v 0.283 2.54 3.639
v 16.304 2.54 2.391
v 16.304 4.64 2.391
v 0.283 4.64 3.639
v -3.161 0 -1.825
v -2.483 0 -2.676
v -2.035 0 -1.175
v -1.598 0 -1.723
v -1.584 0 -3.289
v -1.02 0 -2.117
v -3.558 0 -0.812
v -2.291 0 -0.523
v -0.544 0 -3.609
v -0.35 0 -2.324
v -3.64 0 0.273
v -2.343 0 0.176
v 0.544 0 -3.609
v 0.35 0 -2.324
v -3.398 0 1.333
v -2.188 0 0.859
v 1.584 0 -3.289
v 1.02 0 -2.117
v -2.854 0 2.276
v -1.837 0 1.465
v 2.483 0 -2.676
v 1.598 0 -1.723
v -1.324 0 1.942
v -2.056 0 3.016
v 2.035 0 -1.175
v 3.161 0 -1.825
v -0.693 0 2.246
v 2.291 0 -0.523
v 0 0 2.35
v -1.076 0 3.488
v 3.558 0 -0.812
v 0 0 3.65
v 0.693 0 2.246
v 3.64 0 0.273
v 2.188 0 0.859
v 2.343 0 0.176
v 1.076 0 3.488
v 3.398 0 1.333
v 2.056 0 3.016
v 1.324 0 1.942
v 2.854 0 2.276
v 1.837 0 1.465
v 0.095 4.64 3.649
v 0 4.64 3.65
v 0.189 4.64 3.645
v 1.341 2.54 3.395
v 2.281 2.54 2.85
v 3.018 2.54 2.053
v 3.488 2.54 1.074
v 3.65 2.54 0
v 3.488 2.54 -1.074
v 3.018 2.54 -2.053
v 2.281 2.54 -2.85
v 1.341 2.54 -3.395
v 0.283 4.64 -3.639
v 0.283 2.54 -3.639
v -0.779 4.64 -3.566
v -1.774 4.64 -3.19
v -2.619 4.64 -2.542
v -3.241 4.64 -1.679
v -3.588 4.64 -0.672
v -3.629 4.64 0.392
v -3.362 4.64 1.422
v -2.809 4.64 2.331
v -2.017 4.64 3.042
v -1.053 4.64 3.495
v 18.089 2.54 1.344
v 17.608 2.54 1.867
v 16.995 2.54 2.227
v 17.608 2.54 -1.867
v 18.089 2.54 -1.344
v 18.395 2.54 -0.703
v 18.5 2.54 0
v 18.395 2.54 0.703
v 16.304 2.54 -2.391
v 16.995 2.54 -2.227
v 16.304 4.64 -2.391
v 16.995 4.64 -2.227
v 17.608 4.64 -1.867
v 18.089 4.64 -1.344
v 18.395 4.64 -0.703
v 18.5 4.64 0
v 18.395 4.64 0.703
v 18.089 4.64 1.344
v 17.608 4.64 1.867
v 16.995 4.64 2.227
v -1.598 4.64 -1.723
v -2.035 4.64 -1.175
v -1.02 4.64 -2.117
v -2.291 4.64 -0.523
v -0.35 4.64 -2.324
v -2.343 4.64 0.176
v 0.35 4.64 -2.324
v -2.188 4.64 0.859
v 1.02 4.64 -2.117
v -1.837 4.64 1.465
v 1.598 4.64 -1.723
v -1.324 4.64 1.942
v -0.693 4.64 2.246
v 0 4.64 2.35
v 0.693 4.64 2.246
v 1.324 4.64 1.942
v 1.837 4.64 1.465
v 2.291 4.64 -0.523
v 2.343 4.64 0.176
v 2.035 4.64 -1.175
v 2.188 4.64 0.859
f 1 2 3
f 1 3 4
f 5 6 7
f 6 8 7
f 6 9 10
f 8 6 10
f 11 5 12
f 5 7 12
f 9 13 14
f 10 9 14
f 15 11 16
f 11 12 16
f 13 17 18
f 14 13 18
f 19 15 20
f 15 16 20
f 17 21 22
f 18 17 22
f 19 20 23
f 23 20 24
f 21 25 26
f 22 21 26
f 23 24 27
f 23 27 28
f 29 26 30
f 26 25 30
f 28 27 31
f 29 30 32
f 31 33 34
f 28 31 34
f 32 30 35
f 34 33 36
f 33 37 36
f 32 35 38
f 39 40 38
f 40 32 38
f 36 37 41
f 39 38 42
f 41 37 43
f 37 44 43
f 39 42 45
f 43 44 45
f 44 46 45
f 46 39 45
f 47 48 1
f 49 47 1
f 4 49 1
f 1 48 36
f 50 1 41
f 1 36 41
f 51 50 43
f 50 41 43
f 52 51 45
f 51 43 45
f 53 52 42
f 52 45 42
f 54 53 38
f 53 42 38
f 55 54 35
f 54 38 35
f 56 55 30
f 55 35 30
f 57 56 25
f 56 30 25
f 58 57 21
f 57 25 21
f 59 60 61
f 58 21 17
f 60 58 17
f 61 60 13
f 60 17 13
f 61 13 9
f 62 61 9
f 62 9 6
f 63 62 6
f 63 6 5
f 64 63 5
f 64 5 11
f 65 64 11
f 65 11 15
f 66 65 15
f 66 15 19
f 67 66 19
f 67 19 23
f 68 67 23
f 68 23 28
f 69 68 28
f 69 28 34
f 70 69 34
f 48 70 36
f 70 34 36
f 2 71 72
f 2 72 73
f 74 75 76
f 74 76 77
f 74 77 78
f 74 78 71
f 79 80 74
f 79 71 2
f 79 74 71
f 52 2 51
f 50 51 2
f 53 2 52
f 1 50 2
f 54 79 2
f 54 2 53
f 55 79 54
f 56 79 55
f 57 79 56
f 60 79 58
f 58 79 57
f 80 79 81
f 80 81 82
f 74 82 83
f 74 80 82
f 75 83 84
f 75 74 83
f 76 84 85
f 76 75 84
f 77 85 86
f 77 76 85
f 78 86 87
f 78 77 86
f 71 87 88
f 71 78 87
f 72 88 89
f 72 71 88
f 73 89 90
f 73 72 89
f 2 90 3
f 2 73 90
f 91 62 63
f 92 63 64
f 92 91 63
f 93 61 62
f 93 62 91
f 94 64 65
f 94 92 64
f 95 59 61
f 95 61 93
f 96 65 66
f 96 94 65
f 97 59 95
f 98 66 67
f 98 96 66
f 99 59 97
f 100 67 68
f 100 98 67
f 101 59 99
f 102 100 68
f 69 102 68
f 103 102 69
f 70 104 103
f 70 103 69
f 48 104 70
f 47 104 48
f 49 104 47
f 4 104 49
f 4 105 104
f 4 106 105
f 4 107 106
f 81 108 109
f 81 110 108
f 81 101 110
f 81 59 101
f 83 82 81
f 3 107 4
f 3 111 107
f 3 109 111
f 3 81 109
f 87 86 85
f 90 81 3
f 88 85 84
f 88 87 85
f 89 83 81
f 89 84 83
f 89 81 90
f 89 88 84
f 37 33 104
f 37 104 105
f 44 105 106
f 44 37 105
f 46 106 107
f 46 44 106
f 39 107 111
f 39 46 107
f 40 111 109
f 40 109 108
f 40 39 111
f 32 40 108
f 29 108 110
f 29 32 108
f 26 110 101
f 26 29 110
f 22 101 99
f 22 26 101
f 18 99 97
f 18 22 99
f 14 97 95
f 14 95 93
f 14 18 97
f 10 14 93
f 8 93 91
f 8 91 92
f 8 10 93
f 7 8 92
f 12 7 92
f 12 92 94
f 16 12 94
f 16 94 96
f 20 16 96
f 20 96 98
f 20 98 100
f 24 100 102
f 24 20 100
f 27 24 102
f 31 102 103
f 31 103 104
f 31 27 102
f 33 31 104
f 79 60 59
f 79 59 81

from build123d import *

# Parameters (mm, degrees)
SKETCH1_R           = 3.65
SKETCH1_R_2         = 2.35
BOSS_EXTRUDE1_DEPTH = 4.64
BOSS_EXTRUDE2_START = -2.1
BOSS_EXTRUDE2_DEPTH = 2.1


with BuildPart() as part:
    # Sketch1 → Boss-Extrude1 (new body)
    with BuildSketch(Plane(origin=(0, 0, 0), x_dir=(1, 0, 0), z_dir=(0, 1, 0))):
        with Locations(Location((0, 0, 0), (0, 0, 270))):
            Circle(SKETCH1_R)
        with Locations(Location((0, 0, 0), (0, 0, 270))):
            Circle(SKETCH1_R_2, mode=Mode.SUBTRACT)
    extrude(amount=BOSS_EXTRUDE1_DEPTH)

    # Sketch2 → Boss-Extrude2 (add)
    with BuildSketch(Plane(origin=(0, 4.64, 0), x_dir=(1, 0, 0), z_dir=(0, 1, 0)).offset(BOSS_EXTRUDE2_START)):
        with BuildLine():
            Line((0.283385093, 3.638982397), (16.303738301, 2.391400302))
            ThreePointArc((16.303738301, 2.391400302), (18.500063478, 0), (16.303738301, -2.391400302))
            Line((16.303738301, -2.391400302), (0.283385093, -3.638982397))
            ThreePointArc((0.283385093, -3.638982397), (3.65, 0), (0.283385093, 3.638982397))
        make_face()
    extrude(amount=BOSS_EXTRUDE2_DEPTH)


solid = part.part
